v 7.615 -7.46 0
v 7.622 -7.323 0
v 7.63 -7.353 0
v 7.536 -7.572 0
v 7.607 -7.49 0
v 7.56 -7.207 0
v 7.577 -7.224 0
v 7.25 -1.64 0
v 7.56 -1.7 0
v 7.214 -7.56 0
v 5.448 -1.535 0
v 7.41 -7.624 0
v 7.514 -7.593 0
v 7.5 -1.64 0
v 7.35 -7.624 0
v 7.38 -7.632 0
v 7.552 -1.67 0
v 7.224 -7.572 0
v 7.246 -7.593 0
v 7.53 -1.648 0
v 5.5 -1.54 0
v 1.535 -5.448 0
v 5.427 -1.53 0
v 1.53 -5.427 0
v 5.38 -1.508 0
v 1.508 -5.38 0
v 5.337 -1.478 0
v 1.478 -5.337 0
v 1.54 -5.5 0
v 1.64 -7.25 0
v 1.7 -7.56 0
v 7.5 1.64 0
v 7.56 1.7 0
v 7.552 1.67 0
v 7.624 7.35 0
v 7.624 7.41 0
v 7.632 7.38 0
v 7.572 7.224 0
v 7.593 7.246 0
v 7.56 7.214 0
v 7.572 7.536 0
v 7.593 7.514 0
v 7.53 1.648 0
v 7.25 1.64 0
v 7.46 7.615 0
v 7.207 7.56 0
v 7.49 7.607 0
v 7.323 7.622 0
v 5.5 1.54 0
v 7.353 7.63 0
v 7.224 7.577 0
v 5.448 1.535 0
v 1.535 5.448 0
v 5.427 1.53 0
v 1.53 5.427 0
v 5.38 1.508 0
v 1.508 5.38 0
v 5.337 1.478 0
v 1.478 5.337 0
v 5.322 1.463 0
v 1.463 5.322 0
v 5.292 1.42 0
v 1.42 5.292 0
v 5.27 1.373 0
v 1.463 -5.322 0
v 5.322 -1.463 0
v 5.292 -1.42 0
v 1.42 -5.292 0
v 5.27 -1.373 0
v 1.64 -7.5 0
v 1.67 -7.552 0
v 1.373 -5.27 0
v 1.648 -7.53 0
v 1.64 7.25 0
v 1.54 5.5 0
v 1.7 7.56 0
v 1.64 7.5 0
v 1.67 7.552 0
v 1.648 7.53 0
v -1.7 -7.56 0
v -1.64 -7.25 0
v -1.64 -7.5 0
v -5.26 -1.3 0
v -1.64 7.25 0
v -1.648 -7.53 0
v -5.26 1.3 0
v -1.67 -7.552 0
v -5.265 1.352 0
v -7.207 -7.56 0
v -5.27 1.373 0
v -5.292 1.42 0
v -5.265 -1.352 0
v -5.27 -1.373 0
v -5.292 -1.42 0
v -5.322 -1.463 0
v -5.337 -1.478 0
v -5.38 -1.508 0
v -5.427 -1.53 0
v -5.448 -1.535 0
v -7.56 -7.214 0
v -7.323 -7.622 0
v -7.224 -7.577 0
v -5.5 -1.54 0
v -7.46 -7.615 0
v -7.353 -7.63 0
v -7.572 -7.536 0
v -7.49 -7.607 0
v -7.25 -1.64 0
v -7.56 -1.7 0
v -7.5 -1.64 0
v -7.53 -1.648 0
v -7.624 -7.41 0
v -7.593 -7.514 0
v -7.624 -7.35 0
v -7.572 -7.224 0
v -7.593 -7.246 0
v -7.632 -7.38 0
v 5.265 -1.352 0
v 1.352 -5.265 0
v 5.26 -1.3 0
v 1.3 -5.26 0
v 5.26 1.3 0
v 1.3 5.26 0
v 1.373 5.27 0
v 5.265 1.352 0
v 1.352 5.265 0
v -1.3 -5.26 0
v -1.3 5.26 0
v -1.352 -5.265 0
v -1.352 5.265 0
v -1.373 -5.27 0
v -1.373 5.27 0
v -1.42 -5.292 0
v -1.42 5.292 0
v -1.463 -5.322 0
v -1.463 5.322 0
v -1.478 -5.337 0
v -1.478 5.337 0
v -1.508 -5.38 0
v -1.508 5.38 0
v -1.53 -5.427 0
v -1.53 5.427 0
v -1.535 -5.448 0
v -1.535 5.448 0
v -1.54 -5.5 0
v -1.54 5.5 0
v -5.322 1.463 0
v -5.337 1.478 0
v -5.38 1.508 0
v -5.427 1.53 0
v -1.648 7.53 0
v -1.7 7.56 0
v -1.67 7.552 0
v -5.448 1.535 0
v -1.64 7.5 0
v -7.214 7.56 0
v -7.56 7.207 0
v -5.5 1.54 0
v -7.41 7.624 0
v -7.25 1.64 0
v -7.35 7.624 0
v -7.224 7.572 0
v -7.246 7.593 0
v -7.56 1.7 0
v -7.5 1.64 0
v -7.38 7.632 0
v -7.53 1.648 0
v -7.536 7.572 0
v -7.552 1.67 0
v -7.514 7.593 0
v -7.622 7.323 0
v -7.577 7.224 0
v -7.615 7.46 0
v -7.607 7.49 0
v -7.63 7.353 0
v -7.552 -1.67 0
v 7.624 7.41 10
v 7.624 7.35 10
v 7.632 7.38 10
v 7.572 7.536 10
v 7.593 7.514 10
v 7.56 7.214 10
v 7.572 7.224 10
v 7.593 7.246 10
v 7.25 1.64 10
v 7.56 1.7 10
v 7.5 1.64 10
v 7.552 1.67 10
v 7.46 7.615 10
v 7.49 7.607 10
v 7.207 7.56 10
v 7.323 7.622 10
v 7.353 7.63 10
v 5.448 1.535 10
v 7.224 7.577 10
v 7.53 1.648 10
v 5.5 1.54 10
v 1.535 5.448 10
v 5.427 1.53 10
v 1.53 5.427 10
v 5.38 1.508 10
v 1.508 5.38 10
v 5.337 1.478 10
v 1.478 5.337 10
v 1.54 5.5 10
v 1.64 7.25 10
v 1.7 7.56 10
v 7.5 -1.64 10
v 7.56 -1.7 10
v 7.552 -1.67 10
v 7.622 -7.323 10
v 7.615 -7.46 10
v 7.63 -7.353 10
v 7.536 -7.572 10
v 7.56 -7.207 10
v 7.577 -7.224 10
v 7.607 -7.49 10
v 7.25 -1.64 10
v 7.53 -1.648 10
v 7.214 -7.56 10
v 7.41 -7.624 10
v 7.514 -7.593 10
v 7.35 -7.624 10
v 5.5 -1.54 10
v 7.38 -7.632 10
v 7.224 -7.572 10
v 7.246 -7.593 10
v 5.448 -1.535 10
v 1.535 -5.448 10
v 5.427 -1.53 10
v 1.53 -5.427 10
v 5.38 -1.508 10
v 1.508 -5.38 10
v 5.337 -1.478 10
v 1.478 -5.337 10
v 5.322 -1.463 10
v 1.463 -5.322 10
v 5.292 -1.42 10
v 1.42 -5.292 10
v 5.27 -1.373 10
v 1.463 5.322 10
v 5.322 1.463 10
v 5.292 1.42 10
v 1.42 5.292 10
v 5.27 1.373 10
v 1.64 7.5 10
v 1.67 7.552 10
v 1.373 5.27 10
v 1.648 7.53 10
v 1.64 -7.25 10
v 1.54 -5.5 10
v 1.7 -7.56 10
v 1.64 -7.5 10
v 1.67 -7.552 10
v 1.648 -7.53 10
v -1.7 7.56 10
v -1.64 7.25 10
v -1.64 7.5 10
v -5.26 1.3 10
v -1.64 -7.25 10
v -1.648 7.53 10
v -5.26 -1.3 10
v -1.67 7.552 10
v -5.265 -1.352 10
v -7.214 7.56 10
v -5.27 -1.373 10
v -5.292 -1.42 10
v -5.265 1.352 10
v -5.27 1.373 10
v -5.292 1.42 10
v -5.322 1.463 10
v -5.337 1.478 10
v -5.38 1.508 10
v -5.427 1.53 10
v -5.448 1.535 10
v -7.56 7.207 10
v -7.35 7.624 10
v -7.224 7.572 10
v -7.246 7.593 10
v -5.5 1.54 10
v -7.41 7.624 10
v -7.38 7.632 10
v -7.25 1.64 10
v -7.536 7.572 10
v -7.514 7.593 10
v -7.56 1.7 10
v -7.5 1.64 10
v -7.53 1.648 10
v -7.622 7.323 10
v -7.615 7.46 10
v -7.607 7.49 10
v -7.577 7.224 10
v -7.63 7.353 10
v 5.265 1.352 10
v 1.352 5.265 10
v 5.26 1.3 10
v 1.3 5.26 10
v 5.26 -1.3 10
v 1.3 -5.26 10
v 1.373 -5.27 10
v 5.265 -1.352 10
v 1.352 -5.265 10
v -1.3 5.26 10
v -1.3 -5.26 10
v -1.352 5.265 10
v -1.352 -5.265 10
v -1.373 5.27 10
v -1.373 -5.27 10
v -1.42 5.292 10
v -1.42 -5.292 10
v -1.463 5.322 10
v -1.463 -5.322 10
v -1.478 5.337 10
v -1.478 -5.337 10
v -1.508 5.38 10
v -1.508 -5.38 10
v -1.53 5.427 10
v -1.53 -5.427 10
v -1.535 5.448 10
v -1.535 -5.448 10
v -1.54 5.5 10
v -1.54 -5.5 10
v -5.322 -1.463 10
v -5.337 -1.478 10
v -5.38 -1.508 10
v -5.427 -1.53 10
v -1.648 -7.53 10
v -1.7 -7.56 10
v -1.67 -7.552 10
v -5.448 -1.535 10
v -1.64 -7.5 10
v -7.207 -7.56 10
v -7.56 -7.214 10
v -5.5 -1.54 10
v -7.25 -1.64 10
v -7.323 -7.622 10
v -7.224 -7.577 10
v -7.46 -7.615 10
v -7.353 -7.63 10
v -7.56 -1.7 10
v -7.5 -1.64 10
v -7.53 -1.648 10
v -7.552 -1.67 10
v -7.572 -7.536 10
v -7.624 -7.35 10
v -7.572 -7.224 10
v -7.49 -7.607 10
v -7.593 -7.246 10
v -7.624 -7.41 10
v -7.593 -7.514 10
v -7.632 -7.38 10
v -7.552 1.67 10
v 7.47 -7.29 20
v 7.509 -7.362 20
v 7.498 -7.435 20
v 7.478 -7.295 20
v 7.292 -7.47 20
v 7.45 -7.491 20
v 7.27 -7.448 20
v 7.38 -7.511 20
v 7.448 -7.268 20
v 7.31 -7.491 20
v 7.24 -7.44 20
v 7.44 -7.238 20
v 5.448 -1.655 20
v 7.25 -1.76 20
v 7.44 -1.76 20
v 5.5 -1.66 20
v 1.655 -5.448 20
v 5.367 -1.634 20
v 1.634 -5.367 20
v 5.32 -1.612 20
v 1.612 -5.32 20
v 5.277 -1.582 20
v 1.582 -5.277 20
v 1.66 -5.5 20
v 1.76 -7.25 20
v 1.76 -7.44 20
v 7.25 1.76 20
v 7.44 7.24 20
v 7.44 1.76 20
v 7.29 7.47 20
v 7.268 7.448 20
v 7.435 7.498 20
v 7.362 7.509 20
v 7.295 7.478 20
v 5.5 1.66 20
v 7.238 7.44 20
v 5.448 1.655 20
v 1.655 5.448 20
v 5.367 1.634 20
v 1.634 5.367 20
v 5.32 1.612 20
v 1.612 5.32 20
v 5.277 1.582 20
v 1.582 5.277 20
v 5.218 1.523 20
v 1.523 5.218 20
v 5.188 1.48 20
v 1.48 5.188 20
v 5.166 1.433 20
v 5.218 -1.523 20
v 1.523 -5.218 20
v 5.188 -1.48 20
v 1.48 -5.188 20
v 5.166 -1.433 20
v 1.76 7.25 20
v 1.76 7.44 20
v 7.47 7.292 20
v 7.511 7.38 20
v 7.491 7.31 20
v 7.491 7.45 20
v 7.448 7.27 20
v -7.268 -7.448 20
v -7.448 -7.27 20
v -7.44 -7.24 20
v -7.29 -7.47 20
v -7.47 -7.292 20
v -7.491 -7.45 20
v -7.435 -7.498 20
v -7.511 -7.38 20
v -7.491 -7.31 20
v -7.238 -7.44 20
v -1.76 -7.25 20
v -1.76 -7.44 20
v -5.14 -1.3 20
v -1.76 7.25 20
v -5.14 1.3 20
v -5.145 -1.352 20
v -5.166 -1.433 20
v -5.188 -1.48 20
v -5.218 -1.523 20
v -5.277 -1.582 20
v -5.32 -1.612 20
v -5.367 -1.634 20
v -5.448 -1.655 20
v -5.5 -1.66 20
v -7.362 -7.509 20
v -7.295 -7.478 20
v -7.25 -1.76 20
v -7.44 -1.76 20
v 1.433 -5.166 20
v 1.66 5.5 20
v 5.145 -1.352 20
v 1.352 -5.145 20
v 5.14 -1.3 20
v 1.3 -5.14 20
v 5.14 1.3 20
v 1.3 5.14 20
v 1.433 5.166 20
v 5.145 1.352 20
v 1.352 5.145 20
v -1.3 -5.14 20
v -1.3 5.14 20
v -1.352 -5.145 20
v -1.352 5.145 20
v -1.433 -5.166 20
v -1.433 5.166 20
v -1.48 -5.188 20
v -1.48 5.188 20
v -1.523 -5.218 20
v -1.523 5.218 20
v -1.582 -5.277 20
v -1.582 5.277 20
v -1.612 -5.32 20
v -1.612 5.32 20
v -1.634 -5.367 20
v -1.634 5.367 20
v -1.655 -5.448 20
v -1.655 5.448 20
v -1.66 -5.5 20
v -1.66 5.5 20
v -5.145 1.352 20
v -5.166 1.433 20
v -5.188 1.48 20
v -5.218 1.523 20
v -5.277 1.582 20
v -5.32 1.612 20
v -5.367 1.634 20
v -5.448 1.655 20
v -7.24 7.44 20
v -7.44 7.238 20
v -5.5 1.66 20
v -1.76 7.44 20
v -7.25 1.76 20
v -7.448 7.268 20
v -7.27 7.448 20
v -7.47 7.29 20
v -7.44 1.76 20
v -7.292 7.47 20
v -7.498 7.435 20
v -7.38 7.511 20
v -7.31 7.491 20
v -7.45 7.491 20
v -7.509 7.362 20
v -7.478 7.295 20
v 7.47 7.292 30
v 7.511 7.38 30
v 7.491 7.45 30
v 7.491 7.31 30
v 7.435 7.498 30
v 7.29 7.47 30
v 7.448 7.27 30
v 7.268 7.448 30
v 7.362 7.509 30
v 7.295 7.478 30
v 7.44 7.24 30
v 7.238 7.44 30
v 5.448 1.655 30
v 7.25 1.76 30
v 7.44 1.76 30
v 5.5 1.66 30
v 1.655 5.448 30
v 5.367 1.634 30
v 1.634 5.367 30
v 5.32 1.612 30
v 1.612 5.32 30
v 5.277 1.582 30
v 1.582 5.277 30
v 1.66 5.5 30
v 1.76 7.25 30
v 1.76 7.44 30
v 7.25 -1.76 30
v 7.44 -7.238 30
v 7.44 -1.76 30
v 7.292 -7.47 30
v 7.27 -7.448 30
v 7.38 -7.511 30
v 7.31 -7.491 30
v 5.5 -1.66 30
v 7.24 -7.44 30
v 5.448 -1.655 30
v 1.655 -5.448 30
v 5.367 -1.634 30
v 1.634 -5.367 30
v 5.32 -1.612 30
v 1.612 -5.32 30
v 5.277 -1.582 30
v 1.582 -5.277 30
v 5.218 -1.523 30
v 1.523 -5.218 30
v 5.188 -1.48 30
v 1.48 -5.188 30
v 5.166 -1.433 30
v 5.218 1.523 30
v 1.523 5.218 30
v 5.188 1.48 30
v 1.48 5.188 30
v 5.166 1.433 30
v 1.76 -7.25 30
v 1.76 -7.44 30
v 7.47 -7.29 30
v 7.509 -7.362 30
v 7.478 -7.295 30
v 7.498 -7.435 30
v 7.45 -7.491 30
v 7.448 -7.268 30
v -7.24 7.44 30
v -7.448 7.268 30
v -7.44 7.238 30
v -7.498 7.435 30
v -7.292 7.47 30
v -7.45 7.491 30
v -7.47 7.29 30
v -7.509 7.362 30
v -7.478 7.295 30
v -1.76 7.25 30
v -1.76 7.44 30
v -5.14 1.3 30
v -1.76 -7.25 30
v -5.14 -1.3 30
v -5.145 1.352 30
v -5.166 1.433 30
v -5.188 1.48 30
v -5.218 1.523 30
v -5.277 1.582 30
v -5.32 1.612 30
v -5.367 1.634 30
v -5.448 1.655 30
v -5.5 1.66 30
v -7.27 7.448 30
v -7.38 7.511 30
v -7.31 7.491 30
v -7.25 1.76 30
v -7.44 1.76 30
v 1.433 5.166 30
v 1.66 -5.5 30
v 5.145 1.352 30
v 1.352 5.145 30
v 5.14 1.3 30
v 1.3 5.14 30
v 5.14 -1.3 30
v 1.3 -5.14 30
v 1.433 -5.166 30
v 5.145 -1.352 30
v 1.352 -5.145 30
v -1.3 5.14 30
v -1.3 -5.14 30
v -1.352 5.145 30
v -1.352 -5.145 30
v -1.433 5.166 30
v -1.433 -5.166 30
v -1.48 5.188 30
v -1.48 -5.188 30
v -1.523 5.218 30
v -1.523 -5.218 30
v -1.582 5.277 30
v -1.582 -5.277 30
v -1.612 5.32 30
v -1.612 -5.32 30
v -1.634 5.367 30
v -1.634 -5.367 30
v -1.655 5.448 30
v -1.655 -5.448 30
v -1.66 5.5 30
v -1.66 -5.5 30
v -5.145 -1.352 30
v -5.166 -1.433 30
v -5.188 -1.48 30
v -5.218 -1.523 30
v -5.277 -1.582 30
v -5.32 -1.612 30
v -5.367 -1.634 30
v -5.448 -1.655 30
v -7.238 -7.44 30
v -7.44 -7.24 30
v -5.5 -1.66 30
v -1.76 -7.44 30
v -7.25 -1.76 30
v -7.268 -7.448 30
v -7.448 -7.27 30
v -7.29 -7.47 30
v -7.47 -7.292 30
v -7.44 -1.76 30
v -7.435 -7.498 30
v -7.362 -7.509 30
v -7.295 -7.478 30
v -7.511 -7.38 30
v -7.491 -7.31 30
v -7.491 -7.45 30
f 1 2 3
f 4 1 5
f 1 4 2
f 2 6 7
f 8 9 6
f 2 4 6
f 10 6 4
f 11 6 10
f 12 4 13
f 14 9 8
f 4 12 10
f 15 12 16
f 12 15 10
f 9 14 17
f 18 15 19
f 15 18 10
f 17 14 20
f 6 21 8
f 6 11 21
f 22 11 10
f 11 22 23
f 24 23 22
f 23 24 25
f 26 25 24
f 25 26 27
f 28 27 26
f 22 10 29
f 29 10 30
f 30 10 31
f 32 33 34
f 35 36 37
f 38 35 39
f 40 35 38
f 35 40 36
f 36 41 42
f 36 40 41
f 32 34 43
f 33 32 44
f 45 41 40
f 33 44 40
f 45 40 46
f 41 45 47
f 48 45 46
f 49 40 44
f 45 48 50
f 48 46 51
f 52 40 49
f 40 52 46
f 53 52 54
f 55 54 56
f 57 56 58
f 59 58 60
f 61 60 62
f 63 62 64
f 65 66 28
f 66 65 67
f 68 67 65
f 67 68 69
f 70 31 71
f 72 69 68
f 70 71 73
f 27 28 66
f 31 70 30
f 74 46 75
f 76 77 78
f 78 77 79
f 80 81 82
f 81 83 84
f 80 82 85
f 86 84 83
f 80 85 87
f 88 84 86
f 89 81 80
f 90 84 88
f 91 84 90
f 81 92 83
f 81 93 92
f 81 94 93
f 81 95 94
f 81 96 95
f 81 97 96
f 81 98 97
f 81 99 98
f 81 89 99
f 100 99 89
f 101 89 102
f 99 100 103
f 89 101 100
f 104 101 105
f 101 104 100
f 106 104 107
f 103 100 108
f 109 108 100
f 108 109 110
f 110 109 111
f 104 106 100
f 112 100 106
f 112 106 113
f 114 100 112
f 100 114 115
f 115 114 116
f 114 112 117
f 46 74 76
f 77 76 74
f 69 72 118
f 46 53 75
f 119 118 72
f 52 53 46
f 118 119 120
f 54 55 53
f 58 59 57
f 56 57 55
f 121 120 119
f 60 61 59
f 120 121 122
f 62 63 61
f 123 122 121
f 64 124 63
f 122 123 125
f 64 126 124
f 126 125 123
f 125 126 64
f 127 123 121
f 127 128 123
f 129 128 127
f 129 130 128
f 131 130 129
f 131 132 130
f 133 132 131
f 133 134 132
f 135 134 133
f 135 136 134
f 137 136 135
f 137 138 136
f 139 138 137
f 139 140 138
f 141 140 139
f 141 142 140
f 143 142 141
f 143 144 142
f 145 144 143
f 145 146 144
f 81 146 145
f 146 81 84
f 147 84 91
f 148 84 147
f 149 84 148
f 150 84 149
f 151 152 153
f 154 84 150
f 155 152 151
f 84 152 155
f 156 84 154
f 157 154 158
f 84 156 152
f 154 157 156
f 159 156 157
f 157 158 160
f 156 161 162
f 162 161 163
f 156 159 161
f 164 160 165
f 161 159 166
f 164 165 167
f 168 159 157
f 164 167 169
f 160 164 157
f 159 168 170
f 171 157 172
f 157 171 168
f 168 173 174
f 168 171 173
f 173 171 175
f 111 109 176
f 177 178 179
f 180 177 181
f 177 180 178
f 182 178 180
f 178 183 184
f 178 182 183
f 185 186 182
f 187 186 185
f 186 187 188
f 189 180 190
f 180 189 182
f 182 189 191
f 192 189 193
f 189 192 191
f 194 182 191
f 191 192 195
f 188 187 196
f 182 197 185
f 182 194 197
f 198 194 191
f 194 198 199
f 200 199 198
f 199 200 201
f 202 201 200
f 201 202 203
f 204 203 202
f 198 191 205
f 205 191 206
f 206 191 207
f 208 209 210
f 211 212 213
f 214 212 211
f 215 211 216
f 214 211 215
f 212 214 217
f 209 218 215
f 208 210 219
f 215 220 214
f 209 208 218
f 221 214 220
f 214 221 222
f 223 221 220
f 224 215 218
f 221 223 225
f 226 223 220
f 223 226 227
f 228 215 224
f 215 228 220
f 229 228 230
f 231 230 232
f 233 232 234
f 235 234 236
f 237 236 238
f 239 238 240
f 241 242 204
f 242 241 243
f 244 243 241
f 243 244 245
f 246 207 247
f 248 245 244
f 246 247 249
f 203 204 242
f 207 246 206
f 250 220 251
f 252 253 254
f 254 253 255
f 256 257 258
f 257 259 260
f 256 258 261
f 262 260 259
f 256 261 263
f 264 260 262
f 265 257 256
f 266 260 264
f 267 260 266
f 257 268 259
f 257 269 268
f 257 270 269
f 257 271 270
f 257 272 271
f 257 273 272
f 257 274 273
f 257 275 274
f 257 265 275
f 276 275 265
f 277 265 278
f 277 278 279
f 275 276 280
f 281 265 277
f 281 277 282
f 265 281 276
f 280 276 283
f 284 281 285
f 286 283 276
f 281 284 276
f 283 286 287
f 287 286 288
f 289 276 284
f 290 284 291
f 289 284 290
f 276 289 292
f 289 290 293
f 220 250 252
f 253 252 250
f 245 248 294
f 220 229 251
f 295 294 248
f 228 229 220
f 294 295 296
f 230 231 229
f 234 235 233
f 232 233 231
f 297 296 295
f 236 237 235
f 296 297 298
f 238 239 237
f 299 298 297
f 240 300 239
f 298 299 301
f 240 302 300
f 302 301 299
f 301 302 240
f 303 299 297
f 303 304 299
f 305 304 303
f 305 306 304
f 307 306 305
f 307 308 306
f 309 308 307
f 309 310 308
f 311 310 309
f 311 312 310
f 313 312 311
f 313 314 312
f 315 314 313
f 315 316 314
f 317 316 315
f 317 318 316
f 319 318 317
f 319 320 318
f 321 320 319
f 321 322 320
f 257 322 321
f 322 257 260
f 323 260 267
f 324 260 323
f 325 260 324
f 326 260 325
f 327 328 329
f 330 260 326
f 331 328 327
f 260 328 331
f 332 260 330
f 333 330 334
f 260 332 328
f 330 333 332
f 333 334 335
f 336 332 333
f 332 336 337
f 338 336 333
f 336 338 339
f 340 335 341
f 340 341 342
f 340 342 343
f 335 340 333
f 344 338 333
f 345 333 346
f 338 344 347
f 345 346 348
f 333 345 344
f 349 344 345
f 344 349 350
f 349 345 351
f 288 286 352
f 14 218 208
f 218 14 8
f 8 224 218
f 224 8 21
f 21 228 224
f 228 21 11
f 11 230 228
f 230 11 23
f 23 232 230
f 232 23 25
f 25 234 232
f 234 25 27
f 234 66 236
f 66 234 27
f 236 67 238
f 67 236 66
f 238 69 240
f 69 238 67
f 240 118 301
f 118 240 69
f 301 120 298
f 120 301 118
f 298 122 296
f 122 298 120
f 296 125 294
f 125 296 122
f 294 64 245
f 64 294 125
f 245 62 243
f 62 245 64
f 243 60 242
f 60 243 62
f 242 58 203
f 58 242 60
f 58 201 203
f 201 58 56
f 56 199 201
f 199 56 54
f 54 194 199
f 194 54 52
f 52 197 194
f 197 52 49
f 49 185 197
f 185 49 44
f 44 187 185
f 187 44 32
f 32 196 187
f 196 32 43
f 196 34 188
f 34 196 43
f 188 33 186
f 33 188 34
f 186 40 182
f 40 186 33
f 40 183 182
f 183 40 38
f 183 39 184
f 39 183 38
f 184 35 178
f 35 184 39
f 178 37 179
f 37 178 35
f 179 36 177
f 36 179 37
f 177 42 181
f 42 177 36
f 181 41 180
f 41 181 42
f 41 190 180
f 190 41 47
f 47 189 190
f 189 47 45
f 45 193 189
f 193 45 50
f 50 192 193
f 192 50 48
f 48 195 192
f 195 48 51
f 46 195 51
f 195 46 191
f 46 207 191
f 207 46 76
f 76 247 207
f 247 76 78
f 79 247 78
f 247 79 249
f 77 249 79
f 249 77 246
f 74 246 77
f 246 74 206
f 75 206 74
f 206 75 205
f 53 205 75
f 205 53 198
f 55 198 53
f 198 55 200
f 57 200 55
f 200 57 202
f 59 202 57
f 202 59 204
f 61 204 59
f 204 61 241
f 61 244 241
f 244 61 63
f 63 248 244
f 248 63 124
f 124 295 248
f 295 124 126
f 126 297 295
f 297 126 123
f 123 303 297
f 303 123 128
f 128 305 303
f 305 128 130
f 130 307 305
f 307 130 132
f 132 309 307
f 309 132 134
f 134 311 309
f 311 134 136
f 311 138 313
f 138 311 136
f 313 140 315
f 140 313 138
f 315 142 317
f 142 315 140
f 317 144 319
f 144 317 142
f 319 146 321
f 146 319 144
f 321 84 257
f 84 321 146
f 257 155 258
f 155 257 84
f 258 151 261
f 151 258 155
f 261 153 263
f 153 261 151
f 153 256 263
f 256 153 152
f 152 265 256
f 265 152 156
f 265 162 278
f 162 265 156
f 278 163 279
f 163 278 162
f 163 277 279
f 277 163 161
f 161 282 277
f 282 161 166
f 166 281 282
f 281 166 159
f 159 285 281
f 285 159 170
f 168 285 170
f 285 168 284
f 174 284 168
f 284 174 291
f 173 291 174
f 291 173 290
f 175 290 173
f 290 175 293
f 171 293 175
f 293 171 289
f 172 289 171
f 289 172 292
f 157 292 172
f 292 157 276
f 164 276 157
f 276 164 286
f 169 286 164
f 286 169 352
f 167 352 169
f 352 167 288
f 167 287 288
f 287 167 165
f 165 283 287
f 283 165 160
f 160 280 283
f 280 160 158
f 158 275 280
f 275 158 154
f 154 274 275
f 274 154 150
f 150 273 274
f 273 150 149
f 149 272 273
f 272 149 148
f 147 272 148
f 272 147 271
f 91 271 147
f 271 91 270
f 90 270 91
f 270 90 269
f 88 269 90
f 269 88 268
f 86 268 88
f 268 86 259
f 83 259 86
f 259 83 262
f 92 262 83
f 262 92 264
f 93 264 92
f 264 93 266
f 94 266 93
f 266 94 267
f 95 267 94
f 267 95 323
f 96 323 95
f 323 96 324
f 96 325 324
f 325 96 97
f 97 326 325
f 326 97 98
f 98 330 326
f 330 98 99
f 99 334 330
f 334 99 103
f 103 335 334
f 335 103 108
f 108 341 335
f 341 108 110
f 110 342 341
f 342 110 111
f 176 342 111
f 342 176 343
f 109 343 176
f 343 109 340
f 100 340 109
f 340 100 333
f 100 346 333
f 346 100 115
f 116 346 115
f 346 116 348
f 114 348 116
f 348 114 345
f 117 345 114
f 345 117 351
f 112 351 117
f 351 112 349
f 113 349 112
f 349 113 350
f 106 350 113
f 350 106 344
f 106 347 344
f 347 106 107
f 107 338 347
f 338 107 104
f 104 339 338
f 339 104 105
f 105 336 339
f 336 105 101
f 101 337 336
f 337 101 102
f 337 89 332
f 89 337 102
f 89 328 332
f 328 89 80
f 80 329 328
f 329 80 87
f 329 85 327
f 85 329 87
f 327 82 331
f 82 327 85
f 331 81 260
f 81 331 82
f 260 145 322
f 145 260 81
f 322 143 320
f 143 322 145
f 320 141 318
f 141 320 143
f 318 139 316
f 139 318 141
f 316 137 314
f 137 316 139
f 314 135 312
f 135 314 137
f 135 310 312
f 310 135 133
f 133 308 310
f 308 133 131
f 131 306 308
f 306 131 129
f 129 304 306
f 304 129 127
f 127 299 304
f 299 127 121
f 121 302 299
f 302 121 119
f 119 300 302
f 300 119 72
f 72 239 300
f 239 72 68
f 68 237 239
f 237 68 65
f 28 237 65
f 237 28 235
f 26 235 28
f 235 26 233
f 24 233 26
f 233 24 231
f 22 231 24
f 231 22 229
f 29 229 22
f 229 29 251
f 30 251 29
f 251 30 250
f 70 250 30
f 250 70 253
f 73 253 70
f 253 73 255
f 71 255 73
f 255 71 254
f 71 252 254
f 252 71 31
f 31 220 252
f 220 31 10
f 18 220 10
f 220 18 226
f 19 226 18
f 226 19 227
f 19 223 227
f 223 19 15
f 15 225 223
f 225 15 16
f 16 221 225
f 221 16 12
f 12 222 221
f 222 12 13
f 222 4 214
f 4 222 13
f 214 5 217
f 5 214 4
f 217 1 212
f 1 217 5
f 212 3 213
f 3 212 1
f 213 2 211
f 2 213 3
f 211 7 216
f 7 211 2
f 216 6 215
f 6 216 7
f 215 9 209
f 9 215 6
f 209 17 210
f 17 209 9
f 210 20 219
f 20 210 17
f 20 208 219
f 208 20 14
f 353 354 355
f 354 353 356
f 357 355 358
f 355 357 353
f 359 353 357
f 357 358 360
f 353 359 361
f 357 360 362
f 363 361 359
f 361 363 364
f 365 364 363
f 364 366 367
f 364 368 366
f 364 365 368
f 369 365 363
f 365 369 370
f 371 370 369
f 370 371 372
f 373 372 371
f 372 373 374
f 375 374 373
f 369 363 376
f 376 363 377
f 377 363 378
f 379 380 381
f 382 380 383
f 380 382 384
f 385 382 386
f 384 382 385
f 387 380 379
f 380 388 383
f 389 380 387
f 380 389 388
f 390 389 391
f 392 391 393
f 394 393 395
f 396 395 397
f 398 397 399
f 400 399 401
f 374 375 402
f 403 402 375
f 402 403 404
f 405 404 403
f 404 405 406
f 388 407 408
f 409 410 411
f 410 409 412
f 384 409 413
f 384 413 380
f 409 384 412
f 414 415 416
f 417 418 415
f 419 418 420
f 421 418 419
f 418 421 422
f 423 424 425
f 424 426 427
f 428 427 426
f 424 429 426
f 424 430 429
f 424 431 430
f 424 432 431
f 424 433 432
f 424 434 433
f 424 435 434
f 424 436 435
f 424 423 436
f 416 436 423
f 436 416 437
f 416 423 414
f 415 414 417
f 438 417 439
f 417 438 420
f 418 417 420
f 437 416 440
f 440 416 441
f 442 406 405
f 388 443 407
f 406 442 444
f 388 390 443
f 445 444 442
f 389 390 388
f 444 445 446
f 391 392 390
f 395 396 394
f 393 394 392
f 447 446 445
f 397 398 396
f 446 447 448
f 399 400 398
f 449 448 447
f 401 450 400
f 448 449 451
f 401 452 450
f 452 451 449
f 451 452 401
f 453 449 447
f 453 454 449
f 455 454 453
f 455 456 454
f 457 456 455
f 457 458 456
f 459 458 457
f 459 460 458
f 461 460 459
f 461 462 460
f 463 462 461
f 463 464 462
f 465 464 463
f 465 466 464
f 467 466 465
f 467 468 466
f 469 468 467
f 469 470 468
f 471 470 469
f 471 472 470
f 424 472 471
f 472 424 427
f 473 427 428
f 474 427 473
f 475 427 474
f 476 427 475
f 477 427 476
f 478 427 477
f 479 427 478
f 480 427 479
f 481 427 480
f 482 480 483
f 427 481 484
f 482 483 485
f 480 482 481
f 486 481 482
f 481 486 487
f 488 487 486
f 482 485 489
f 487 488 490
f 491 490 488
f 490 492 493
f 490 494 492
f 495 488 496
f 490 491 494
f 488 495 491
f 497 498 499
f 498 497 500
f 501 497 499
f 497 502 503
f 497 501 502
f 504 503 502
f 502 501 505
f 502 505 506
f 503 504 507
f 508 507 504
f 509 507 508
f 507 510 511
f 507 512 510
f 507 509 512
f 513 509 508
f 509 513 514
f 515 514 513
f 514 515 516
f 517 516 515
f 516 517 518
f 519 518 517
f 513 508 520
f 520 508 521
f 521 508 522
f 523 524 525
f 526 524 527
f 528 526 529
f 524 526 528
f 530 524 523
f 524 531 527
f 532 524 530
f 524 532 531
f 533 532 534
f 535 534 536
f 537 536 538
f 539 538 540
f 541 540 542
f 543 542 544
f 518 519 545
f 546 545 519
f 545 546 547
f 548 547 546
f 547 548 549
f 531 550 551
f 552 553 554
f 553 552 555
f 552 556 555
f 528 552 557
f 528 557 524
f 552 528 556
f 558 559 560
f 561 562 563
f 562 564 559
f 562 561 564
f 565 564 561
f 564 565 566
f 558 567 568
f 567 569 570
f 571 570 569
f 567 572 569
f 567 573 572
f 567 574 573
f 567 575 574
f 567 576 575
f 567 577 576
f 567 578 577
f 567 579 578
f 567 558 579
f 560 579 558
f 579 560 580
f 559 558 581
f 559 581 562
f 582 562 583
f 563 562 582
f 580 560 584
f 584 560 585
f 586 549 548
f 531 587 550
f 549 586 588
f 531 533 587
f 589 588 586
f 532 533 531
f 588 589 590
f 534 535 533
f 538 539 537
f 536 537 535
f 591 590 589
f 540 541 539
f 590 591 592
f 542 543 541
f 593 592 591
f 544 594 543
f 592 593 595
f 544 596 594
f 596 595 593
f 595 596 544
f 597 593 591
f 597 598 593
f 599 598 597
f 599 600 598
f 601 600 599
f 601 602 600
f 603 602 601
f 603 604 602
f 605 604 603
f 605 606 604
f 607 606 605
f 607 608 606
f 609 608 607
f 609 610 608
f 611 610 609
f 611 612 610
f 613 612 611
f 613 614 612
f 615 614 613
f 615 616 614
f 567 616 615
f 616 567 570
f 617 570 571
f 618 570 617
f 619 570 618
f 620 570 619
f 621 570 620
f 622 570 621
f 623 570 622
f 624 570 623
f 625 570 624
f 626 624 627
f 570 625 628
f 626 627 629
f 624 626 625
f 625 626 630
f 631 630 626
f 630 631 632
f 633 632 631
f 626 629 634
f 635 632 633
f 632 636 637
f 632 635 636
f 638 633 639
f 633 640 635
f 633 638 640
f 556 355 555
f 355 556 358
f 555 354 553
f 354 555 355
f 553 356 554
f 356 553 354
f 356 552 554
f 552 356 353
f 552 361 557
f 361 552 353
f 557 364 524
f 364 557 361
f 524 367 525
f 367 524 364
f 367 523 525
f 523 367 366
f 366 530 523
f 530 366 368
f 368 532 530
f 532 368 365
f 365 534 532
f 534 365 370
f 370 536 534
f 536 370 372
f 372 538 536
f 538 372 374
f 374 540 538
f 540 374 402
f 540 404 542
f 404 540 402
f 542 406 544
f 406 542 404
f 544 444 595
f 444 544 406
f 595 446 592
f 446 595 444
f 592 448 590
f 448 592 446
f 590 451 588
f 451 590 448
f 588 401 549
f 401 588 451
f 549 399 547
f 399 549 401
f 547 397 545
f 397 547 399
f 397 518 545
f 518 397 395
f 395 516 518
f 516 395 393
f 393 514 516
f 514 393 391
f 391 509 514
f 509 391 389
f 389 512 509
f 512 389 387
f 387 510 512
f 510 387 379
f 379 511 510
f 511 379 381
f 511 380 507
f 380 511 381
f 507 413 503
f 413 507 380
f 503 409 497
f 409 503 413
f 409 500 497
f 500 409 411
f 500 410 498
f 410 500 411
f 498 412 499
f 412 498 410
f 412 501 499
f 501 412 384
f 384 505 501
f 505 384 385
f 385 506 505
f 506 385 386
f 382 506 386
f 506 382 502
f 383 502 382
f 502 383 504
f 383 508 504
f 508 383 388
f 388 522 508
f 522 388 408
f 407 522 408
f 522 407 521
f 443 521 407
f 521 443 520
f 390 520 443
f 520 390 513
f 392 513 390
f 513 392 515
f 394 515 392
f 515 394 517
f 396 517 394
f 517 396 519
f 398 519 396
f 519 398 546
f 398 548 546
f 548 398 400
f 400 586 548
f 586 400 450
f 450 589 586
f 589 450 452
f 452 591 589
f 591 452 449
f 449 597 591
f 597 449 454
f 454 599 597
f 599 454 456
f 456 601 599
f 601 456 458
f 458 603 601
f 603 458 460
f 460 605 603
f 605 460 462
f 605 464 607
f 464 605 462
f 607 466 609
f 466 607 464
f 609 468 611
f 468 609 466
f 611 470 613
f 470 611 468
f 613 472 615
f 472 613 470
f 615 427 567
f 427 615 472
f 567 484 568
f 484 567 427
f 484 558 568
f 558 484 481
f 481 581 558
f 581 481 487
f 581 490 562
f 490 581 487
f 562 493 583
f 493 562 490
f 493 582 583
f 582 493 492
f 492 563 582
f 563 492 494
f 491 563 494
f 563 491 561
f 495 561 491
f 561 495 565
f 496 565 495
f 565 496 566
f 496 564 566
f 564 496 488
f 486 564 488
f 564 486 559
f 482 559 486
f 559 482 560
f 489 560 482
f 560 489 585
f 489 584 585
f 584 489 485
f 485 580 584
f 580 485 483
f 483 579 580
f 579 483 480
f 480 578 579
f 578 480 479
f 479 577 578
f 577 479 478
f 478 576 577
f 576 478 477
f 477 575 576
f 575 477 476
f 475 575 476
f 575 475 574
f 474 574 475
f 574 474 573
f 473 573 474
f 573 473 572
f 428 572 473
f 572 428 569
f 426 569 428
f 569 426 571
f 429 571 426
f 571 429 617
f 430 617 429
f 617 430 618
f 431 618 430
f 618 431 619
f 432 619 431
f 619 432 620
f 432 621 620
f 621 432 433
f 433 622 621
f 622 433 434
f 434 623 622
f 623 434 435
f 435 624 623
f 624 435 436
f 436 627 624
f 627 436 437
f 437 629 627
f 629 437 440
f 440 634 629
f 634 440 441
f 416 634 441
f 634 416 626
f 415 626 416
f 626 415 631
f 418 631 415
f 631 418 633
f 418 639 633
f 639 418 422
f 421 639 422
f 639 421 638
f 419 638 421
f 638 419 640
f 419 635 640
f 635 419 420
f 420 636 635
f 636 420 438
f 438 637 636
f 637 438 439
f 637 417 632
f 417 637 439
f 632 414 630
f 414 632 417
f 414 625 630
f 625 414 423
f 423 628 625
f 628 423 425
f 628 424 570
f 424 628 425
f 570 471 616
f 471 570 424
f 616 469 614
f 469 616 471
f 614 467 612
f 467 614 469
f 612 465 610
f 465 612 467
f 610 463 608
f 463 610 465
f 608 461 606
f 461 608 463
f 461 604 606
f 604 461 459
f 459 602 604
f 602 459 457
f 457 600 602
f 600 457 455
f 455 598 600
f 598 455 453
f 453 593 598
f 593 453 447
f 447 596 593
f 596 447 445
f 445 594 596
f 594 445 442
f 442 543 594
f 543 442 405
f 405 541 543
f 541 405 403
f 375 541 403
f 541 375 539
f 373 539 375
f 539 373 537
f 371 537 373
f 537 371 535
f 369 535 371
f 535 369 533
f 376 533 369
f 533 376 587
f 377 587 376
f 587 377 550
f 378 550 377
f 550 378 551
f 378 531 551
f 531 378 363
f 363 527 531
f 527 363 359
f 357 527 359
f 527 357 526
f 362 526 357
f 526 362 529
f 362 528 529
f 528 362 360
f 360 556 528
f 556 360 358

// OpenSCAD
// Model for Misumi HFS3-1515 extrusion

ext15(10,0.12);
%translate([0,0,-.1]) ext15(30.2,0);
translate([0,0,20])ext15(10,-0.12);

//%translate([0,0,.5]) ext15profile();
//ext15profile(-0.1);

ew=15;  // extrusion width

module ext15(len,fuzz=0) {
  if (fuzz == 0)
    linear_extrude(len) ext15profile();
  else if (fuzz > 0)
    linear_extrude(len) minkowski() {
      ext15profile(fuzz,1.5*fuzz);
      circle(r=fuzz/2,$fn=12);
    }
  else linear_extrude(len) difference() {
    square([ew+1,ew+1],center=true);
    minkowski() {
      difference() {
        square([ew+2,ew+2],center=true);
        ext15profile(fuzz,-1.5*fuzz);
      }
      circle(r=-fuzz/2,$fn=12);
    }
  }
}


// these are used (almost) exclusively for cutting out
//    hi-fi when fuzz=0, for cut-outs otherwise
//    crr -- corner relief radius, for cutouts
// fuzz>0 for 3d-printing slop, where we want hole to be a little oversized for overextrusion
// fuzz<0 for laser-cut profile, where we want hole undersized for kerf
module ext15profile(fuzz=0,crr=0.2) {
rc=1;  // radius of outer corner
sw=3.4; // width of slot
swi=5.7;  // width slot, inside
cbr=2.5/2;  // center bore radius
wt=1.1; // outide wall thickness
shi = 2.6;  // slot height, inner.  max nut height
sd = wt+shi+1;  // total slot depth, from surface

  if (fuzz==0) { // high-fidelity model
    difference() {
      hull() for(x=[-1,1]) for(y=[-1,1])
        translate([x*(ew/2-rc),y*(ew/2-rc)])
          circle(r=rc,$fn=36);

      circle(r=cbr,$fn=36);
      for(a=[0:90:355]) rotate(a) union() {
        translate([ew/2,0]) square([sd*2,sw],center=true);
        
        hull() {
          translate([ew/2-sd+1,0]) square([2,swi-2],center=true);
          translate([ew/2-wt-shi/2,0]) square([shi,swi],center=true);
        }
      }
    }

  } else {  // lower-fidelity for cutouts
        
    union() {
      difference() {
        //hull() for(x=[-1,1]) for(y=[-1,1])
        //translate([x*(ew/2-abs(fuzz*2)),y*(ew/2-abs(fuzz*2))])
        //  circle(r=abs(fuzz)*2,$fn=12);
        square([ew,ew],center=true);

        for (a=[0:90:355]) rotate(a)
          hull() {
            translate([ew/2,0]) square([.5,sw],center=true);
            for(y=[-1,1])  // tabs need to go deep to hold M3 nut cut-outs sometimes
              translate([ew/2-2,y*(sw/2-0.4)])
                circle(0.3,$fn=36);
          }
      }

      // add extra corner relief for cutouts
      for (a=[0:90:355]) rotate(a) {
        translate([ew/2-abs(fuzz),ew/2-abs(fuzz)])
            circle(r=abs(fuzz)*1.6,$fn=11);

          // relief at corner of slots
          //for (y=[-1,1])
          //  translate([w/2-crr*.7,y*(slot/2+crr*0.8)])
          //    circle(r=crr,$fn=11);
      }
    
    }
  }
}
